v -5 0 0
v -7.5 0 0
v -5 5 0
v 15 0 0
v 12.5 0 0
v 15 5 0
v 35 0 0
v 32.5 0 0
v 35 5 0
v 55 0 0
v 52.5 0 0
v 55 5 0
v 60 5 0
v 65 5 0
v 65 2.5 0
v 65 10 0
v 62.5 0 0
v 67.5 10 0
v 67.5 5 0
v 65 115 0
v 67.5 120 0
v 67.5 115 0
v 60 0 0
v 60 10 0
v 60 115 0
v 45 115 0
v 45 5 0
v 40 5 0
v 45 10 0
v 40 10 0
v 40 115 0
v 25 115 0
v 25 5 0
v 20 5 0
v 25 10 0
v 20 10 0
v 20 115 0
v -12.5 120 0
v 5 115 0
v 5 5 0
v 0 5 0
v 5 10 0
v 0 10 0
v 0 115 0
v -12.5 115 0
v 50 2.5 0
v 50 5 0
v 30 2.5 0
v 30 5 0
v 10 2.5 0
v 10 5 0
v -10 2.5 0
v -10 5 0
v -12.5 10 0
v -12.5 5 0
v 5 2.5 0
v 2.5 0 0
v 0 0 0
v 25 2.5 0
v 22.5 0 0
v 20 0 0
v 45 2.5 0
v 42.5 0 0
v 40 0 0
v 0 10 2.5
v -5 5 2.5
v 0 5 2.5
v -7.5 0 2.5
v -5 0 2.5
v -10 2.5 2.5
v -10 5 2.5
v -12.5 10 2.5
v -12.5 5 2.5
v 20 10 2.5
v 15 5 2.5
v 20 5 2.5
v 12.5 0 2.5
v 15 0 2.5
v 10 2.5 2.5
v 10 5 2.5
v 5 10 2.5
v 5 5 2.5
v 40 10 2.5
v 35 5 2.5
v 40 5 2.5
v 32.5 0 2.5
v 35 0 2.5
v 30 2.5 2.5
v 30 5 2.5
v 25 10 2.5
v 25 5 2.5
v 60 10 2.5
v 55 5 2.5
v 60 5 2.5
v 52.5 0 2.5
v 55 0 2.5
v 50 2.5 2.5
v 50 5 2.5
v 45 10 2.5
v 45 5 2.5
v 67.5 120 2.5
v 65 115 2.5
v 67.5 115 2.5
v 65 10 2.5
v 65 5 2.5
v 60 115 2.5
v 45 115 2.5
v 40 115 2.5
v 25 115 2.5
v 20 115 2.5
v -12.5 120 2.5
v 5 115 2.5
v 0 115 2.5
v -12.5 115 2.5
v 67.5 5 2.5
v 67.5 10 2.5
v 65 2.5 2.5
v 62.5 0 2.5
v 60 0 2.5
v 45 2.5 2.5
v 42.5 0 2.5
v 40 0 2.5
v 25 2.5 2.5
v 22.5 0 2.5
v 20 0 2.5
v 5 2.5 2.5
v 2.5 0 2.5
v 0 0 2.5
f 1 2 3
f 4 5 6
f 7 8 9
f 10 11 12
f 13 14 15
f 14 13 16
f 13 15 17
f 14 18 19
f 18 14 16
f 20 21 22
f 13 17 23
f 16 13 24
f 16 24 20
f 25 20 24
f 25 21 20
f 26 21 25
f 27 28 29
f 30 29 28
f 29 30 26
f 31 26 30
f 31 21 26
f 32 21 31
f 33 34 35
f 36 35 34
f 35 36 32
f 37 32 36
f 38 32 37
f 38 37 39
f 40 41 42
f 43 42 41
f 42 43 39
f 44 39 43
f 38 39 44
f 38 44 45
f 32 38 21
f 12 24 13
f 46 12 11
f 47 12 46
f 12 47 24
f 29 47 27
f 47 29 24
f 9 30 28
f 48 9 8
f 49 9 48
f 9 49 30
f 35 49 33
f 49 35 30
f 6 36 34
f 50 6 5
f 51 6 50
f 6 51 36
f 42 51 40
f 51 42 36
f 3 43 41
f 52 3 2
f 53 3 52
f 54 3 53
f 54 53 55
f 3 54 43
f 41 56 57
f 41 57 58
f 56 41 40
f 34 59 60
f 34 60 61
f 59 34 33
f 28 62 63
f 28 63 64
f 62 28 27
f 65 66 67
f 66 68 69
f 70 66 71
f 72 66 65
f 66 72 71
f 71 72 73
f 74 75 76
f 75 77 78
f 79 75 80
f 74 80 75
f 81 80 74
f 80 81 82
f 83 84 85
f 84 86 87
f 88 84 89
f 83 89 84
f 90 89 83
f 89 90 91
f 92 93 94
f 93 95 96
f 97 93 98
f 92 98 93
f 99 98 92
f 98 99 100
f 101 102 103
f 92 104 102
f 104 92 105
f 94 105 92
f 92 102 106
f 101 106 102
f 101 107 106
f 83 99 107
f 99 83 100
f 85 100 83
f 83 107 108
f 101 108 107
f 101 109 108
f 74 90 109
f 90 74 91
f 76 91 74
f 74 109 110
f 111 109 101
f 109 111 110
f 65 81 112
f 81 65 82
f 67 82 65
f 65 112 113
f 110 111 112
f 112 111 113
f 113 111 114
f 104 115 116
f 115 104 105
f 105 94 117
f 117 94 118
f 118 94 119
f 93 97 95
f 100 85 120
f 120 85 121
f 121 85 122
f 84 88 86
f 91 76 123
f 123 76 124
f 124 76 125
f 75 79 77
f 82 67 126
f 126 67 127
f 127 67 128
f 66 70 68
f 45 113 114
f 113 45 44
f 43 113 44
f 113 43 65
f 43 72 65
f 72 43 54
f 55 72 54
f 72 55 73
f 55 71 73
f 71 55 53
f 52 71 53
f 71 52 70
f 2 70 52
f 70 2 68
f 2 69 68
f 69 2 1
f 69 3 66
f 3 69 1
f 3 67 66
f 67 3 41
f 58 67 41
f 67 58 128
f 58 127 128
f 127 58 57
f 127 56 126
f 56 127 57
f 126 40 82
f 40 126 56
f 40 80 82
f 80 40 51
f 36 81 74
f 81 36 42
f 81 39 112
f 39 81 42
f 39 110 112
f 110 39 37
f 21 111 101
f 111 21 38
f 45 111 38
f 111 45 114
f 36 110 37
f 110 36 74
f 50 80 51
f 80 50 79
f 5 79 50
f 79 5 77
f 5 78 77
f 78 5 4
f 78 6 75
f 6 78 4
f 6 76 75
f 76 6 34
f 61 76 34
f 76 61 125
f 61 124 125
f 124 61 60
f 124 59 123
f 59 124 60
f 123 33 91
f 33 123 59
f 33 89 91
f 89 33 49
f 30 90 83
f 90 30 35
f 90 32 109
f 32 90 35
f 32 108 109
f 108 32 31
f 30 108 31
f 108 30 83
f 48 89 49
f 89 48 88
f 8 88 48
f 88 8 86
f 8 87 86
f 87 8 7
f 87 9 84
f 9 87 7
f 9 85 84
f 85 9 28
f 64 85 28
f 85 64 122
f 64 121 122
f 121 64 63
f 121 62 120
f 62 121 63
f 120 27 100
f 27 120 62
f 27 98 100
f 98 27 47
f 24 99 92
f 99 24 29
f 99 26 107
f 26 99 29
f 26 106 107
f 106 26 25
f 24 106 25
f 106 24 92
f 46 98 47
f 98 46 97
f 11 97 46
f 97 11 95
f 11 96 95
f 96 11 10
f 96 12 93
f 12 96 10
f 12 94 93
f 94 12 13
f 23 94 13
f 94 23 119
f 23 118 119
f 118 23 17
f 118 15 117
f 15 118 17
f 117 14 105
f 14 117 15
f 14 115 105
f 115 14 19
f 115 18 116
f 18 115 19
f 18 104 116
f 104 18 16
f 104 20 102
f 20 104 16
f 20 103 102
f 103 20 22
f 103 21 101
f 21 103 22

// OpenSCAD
// Author: Dima 'DiAleksi' Tsvetkov
// Date: 2019-09-15

//Horizontal amount of the cats
cats_x = 4; //[2 : 100]

//Vetical amount of the cats
cats_y = 4; //[2 : 100]


multiply();

module multiply() {
    shapes = [];

    for(a = [0 : cats_x - 1]) {
        x = 20*a;
        y = 30*cats_y;
        one(x, y);
    }
}

module one(x, y) {
    vertical_addition = [[x,30],[x+5,30],[x+5,y],[x,y]];
    bottom = [[x,0],[x+2.5,0],[x+5,2.5],[x+5,5],[x+7.5,5],[x+7.5,10],[x+5,10],[x+5,30],[x,30],[x,10],[x-12.5,10],[x-12.5,5],[x-10,5],[x-10,2.5],[x-7.5,0],[x-5,0],[x-5,5],[x,5]];
    vertical_close = [[x,y],[x-12.5,y],[x-12.5,y-5],[x+7.5,y-5],[x+7.5,y]];
    
    linear_extrude(2.5){ 
        union() {
            polygon(bottom);
            polygon(vertical_addition);
            polygon(vertical_close);
        }
    }
}
